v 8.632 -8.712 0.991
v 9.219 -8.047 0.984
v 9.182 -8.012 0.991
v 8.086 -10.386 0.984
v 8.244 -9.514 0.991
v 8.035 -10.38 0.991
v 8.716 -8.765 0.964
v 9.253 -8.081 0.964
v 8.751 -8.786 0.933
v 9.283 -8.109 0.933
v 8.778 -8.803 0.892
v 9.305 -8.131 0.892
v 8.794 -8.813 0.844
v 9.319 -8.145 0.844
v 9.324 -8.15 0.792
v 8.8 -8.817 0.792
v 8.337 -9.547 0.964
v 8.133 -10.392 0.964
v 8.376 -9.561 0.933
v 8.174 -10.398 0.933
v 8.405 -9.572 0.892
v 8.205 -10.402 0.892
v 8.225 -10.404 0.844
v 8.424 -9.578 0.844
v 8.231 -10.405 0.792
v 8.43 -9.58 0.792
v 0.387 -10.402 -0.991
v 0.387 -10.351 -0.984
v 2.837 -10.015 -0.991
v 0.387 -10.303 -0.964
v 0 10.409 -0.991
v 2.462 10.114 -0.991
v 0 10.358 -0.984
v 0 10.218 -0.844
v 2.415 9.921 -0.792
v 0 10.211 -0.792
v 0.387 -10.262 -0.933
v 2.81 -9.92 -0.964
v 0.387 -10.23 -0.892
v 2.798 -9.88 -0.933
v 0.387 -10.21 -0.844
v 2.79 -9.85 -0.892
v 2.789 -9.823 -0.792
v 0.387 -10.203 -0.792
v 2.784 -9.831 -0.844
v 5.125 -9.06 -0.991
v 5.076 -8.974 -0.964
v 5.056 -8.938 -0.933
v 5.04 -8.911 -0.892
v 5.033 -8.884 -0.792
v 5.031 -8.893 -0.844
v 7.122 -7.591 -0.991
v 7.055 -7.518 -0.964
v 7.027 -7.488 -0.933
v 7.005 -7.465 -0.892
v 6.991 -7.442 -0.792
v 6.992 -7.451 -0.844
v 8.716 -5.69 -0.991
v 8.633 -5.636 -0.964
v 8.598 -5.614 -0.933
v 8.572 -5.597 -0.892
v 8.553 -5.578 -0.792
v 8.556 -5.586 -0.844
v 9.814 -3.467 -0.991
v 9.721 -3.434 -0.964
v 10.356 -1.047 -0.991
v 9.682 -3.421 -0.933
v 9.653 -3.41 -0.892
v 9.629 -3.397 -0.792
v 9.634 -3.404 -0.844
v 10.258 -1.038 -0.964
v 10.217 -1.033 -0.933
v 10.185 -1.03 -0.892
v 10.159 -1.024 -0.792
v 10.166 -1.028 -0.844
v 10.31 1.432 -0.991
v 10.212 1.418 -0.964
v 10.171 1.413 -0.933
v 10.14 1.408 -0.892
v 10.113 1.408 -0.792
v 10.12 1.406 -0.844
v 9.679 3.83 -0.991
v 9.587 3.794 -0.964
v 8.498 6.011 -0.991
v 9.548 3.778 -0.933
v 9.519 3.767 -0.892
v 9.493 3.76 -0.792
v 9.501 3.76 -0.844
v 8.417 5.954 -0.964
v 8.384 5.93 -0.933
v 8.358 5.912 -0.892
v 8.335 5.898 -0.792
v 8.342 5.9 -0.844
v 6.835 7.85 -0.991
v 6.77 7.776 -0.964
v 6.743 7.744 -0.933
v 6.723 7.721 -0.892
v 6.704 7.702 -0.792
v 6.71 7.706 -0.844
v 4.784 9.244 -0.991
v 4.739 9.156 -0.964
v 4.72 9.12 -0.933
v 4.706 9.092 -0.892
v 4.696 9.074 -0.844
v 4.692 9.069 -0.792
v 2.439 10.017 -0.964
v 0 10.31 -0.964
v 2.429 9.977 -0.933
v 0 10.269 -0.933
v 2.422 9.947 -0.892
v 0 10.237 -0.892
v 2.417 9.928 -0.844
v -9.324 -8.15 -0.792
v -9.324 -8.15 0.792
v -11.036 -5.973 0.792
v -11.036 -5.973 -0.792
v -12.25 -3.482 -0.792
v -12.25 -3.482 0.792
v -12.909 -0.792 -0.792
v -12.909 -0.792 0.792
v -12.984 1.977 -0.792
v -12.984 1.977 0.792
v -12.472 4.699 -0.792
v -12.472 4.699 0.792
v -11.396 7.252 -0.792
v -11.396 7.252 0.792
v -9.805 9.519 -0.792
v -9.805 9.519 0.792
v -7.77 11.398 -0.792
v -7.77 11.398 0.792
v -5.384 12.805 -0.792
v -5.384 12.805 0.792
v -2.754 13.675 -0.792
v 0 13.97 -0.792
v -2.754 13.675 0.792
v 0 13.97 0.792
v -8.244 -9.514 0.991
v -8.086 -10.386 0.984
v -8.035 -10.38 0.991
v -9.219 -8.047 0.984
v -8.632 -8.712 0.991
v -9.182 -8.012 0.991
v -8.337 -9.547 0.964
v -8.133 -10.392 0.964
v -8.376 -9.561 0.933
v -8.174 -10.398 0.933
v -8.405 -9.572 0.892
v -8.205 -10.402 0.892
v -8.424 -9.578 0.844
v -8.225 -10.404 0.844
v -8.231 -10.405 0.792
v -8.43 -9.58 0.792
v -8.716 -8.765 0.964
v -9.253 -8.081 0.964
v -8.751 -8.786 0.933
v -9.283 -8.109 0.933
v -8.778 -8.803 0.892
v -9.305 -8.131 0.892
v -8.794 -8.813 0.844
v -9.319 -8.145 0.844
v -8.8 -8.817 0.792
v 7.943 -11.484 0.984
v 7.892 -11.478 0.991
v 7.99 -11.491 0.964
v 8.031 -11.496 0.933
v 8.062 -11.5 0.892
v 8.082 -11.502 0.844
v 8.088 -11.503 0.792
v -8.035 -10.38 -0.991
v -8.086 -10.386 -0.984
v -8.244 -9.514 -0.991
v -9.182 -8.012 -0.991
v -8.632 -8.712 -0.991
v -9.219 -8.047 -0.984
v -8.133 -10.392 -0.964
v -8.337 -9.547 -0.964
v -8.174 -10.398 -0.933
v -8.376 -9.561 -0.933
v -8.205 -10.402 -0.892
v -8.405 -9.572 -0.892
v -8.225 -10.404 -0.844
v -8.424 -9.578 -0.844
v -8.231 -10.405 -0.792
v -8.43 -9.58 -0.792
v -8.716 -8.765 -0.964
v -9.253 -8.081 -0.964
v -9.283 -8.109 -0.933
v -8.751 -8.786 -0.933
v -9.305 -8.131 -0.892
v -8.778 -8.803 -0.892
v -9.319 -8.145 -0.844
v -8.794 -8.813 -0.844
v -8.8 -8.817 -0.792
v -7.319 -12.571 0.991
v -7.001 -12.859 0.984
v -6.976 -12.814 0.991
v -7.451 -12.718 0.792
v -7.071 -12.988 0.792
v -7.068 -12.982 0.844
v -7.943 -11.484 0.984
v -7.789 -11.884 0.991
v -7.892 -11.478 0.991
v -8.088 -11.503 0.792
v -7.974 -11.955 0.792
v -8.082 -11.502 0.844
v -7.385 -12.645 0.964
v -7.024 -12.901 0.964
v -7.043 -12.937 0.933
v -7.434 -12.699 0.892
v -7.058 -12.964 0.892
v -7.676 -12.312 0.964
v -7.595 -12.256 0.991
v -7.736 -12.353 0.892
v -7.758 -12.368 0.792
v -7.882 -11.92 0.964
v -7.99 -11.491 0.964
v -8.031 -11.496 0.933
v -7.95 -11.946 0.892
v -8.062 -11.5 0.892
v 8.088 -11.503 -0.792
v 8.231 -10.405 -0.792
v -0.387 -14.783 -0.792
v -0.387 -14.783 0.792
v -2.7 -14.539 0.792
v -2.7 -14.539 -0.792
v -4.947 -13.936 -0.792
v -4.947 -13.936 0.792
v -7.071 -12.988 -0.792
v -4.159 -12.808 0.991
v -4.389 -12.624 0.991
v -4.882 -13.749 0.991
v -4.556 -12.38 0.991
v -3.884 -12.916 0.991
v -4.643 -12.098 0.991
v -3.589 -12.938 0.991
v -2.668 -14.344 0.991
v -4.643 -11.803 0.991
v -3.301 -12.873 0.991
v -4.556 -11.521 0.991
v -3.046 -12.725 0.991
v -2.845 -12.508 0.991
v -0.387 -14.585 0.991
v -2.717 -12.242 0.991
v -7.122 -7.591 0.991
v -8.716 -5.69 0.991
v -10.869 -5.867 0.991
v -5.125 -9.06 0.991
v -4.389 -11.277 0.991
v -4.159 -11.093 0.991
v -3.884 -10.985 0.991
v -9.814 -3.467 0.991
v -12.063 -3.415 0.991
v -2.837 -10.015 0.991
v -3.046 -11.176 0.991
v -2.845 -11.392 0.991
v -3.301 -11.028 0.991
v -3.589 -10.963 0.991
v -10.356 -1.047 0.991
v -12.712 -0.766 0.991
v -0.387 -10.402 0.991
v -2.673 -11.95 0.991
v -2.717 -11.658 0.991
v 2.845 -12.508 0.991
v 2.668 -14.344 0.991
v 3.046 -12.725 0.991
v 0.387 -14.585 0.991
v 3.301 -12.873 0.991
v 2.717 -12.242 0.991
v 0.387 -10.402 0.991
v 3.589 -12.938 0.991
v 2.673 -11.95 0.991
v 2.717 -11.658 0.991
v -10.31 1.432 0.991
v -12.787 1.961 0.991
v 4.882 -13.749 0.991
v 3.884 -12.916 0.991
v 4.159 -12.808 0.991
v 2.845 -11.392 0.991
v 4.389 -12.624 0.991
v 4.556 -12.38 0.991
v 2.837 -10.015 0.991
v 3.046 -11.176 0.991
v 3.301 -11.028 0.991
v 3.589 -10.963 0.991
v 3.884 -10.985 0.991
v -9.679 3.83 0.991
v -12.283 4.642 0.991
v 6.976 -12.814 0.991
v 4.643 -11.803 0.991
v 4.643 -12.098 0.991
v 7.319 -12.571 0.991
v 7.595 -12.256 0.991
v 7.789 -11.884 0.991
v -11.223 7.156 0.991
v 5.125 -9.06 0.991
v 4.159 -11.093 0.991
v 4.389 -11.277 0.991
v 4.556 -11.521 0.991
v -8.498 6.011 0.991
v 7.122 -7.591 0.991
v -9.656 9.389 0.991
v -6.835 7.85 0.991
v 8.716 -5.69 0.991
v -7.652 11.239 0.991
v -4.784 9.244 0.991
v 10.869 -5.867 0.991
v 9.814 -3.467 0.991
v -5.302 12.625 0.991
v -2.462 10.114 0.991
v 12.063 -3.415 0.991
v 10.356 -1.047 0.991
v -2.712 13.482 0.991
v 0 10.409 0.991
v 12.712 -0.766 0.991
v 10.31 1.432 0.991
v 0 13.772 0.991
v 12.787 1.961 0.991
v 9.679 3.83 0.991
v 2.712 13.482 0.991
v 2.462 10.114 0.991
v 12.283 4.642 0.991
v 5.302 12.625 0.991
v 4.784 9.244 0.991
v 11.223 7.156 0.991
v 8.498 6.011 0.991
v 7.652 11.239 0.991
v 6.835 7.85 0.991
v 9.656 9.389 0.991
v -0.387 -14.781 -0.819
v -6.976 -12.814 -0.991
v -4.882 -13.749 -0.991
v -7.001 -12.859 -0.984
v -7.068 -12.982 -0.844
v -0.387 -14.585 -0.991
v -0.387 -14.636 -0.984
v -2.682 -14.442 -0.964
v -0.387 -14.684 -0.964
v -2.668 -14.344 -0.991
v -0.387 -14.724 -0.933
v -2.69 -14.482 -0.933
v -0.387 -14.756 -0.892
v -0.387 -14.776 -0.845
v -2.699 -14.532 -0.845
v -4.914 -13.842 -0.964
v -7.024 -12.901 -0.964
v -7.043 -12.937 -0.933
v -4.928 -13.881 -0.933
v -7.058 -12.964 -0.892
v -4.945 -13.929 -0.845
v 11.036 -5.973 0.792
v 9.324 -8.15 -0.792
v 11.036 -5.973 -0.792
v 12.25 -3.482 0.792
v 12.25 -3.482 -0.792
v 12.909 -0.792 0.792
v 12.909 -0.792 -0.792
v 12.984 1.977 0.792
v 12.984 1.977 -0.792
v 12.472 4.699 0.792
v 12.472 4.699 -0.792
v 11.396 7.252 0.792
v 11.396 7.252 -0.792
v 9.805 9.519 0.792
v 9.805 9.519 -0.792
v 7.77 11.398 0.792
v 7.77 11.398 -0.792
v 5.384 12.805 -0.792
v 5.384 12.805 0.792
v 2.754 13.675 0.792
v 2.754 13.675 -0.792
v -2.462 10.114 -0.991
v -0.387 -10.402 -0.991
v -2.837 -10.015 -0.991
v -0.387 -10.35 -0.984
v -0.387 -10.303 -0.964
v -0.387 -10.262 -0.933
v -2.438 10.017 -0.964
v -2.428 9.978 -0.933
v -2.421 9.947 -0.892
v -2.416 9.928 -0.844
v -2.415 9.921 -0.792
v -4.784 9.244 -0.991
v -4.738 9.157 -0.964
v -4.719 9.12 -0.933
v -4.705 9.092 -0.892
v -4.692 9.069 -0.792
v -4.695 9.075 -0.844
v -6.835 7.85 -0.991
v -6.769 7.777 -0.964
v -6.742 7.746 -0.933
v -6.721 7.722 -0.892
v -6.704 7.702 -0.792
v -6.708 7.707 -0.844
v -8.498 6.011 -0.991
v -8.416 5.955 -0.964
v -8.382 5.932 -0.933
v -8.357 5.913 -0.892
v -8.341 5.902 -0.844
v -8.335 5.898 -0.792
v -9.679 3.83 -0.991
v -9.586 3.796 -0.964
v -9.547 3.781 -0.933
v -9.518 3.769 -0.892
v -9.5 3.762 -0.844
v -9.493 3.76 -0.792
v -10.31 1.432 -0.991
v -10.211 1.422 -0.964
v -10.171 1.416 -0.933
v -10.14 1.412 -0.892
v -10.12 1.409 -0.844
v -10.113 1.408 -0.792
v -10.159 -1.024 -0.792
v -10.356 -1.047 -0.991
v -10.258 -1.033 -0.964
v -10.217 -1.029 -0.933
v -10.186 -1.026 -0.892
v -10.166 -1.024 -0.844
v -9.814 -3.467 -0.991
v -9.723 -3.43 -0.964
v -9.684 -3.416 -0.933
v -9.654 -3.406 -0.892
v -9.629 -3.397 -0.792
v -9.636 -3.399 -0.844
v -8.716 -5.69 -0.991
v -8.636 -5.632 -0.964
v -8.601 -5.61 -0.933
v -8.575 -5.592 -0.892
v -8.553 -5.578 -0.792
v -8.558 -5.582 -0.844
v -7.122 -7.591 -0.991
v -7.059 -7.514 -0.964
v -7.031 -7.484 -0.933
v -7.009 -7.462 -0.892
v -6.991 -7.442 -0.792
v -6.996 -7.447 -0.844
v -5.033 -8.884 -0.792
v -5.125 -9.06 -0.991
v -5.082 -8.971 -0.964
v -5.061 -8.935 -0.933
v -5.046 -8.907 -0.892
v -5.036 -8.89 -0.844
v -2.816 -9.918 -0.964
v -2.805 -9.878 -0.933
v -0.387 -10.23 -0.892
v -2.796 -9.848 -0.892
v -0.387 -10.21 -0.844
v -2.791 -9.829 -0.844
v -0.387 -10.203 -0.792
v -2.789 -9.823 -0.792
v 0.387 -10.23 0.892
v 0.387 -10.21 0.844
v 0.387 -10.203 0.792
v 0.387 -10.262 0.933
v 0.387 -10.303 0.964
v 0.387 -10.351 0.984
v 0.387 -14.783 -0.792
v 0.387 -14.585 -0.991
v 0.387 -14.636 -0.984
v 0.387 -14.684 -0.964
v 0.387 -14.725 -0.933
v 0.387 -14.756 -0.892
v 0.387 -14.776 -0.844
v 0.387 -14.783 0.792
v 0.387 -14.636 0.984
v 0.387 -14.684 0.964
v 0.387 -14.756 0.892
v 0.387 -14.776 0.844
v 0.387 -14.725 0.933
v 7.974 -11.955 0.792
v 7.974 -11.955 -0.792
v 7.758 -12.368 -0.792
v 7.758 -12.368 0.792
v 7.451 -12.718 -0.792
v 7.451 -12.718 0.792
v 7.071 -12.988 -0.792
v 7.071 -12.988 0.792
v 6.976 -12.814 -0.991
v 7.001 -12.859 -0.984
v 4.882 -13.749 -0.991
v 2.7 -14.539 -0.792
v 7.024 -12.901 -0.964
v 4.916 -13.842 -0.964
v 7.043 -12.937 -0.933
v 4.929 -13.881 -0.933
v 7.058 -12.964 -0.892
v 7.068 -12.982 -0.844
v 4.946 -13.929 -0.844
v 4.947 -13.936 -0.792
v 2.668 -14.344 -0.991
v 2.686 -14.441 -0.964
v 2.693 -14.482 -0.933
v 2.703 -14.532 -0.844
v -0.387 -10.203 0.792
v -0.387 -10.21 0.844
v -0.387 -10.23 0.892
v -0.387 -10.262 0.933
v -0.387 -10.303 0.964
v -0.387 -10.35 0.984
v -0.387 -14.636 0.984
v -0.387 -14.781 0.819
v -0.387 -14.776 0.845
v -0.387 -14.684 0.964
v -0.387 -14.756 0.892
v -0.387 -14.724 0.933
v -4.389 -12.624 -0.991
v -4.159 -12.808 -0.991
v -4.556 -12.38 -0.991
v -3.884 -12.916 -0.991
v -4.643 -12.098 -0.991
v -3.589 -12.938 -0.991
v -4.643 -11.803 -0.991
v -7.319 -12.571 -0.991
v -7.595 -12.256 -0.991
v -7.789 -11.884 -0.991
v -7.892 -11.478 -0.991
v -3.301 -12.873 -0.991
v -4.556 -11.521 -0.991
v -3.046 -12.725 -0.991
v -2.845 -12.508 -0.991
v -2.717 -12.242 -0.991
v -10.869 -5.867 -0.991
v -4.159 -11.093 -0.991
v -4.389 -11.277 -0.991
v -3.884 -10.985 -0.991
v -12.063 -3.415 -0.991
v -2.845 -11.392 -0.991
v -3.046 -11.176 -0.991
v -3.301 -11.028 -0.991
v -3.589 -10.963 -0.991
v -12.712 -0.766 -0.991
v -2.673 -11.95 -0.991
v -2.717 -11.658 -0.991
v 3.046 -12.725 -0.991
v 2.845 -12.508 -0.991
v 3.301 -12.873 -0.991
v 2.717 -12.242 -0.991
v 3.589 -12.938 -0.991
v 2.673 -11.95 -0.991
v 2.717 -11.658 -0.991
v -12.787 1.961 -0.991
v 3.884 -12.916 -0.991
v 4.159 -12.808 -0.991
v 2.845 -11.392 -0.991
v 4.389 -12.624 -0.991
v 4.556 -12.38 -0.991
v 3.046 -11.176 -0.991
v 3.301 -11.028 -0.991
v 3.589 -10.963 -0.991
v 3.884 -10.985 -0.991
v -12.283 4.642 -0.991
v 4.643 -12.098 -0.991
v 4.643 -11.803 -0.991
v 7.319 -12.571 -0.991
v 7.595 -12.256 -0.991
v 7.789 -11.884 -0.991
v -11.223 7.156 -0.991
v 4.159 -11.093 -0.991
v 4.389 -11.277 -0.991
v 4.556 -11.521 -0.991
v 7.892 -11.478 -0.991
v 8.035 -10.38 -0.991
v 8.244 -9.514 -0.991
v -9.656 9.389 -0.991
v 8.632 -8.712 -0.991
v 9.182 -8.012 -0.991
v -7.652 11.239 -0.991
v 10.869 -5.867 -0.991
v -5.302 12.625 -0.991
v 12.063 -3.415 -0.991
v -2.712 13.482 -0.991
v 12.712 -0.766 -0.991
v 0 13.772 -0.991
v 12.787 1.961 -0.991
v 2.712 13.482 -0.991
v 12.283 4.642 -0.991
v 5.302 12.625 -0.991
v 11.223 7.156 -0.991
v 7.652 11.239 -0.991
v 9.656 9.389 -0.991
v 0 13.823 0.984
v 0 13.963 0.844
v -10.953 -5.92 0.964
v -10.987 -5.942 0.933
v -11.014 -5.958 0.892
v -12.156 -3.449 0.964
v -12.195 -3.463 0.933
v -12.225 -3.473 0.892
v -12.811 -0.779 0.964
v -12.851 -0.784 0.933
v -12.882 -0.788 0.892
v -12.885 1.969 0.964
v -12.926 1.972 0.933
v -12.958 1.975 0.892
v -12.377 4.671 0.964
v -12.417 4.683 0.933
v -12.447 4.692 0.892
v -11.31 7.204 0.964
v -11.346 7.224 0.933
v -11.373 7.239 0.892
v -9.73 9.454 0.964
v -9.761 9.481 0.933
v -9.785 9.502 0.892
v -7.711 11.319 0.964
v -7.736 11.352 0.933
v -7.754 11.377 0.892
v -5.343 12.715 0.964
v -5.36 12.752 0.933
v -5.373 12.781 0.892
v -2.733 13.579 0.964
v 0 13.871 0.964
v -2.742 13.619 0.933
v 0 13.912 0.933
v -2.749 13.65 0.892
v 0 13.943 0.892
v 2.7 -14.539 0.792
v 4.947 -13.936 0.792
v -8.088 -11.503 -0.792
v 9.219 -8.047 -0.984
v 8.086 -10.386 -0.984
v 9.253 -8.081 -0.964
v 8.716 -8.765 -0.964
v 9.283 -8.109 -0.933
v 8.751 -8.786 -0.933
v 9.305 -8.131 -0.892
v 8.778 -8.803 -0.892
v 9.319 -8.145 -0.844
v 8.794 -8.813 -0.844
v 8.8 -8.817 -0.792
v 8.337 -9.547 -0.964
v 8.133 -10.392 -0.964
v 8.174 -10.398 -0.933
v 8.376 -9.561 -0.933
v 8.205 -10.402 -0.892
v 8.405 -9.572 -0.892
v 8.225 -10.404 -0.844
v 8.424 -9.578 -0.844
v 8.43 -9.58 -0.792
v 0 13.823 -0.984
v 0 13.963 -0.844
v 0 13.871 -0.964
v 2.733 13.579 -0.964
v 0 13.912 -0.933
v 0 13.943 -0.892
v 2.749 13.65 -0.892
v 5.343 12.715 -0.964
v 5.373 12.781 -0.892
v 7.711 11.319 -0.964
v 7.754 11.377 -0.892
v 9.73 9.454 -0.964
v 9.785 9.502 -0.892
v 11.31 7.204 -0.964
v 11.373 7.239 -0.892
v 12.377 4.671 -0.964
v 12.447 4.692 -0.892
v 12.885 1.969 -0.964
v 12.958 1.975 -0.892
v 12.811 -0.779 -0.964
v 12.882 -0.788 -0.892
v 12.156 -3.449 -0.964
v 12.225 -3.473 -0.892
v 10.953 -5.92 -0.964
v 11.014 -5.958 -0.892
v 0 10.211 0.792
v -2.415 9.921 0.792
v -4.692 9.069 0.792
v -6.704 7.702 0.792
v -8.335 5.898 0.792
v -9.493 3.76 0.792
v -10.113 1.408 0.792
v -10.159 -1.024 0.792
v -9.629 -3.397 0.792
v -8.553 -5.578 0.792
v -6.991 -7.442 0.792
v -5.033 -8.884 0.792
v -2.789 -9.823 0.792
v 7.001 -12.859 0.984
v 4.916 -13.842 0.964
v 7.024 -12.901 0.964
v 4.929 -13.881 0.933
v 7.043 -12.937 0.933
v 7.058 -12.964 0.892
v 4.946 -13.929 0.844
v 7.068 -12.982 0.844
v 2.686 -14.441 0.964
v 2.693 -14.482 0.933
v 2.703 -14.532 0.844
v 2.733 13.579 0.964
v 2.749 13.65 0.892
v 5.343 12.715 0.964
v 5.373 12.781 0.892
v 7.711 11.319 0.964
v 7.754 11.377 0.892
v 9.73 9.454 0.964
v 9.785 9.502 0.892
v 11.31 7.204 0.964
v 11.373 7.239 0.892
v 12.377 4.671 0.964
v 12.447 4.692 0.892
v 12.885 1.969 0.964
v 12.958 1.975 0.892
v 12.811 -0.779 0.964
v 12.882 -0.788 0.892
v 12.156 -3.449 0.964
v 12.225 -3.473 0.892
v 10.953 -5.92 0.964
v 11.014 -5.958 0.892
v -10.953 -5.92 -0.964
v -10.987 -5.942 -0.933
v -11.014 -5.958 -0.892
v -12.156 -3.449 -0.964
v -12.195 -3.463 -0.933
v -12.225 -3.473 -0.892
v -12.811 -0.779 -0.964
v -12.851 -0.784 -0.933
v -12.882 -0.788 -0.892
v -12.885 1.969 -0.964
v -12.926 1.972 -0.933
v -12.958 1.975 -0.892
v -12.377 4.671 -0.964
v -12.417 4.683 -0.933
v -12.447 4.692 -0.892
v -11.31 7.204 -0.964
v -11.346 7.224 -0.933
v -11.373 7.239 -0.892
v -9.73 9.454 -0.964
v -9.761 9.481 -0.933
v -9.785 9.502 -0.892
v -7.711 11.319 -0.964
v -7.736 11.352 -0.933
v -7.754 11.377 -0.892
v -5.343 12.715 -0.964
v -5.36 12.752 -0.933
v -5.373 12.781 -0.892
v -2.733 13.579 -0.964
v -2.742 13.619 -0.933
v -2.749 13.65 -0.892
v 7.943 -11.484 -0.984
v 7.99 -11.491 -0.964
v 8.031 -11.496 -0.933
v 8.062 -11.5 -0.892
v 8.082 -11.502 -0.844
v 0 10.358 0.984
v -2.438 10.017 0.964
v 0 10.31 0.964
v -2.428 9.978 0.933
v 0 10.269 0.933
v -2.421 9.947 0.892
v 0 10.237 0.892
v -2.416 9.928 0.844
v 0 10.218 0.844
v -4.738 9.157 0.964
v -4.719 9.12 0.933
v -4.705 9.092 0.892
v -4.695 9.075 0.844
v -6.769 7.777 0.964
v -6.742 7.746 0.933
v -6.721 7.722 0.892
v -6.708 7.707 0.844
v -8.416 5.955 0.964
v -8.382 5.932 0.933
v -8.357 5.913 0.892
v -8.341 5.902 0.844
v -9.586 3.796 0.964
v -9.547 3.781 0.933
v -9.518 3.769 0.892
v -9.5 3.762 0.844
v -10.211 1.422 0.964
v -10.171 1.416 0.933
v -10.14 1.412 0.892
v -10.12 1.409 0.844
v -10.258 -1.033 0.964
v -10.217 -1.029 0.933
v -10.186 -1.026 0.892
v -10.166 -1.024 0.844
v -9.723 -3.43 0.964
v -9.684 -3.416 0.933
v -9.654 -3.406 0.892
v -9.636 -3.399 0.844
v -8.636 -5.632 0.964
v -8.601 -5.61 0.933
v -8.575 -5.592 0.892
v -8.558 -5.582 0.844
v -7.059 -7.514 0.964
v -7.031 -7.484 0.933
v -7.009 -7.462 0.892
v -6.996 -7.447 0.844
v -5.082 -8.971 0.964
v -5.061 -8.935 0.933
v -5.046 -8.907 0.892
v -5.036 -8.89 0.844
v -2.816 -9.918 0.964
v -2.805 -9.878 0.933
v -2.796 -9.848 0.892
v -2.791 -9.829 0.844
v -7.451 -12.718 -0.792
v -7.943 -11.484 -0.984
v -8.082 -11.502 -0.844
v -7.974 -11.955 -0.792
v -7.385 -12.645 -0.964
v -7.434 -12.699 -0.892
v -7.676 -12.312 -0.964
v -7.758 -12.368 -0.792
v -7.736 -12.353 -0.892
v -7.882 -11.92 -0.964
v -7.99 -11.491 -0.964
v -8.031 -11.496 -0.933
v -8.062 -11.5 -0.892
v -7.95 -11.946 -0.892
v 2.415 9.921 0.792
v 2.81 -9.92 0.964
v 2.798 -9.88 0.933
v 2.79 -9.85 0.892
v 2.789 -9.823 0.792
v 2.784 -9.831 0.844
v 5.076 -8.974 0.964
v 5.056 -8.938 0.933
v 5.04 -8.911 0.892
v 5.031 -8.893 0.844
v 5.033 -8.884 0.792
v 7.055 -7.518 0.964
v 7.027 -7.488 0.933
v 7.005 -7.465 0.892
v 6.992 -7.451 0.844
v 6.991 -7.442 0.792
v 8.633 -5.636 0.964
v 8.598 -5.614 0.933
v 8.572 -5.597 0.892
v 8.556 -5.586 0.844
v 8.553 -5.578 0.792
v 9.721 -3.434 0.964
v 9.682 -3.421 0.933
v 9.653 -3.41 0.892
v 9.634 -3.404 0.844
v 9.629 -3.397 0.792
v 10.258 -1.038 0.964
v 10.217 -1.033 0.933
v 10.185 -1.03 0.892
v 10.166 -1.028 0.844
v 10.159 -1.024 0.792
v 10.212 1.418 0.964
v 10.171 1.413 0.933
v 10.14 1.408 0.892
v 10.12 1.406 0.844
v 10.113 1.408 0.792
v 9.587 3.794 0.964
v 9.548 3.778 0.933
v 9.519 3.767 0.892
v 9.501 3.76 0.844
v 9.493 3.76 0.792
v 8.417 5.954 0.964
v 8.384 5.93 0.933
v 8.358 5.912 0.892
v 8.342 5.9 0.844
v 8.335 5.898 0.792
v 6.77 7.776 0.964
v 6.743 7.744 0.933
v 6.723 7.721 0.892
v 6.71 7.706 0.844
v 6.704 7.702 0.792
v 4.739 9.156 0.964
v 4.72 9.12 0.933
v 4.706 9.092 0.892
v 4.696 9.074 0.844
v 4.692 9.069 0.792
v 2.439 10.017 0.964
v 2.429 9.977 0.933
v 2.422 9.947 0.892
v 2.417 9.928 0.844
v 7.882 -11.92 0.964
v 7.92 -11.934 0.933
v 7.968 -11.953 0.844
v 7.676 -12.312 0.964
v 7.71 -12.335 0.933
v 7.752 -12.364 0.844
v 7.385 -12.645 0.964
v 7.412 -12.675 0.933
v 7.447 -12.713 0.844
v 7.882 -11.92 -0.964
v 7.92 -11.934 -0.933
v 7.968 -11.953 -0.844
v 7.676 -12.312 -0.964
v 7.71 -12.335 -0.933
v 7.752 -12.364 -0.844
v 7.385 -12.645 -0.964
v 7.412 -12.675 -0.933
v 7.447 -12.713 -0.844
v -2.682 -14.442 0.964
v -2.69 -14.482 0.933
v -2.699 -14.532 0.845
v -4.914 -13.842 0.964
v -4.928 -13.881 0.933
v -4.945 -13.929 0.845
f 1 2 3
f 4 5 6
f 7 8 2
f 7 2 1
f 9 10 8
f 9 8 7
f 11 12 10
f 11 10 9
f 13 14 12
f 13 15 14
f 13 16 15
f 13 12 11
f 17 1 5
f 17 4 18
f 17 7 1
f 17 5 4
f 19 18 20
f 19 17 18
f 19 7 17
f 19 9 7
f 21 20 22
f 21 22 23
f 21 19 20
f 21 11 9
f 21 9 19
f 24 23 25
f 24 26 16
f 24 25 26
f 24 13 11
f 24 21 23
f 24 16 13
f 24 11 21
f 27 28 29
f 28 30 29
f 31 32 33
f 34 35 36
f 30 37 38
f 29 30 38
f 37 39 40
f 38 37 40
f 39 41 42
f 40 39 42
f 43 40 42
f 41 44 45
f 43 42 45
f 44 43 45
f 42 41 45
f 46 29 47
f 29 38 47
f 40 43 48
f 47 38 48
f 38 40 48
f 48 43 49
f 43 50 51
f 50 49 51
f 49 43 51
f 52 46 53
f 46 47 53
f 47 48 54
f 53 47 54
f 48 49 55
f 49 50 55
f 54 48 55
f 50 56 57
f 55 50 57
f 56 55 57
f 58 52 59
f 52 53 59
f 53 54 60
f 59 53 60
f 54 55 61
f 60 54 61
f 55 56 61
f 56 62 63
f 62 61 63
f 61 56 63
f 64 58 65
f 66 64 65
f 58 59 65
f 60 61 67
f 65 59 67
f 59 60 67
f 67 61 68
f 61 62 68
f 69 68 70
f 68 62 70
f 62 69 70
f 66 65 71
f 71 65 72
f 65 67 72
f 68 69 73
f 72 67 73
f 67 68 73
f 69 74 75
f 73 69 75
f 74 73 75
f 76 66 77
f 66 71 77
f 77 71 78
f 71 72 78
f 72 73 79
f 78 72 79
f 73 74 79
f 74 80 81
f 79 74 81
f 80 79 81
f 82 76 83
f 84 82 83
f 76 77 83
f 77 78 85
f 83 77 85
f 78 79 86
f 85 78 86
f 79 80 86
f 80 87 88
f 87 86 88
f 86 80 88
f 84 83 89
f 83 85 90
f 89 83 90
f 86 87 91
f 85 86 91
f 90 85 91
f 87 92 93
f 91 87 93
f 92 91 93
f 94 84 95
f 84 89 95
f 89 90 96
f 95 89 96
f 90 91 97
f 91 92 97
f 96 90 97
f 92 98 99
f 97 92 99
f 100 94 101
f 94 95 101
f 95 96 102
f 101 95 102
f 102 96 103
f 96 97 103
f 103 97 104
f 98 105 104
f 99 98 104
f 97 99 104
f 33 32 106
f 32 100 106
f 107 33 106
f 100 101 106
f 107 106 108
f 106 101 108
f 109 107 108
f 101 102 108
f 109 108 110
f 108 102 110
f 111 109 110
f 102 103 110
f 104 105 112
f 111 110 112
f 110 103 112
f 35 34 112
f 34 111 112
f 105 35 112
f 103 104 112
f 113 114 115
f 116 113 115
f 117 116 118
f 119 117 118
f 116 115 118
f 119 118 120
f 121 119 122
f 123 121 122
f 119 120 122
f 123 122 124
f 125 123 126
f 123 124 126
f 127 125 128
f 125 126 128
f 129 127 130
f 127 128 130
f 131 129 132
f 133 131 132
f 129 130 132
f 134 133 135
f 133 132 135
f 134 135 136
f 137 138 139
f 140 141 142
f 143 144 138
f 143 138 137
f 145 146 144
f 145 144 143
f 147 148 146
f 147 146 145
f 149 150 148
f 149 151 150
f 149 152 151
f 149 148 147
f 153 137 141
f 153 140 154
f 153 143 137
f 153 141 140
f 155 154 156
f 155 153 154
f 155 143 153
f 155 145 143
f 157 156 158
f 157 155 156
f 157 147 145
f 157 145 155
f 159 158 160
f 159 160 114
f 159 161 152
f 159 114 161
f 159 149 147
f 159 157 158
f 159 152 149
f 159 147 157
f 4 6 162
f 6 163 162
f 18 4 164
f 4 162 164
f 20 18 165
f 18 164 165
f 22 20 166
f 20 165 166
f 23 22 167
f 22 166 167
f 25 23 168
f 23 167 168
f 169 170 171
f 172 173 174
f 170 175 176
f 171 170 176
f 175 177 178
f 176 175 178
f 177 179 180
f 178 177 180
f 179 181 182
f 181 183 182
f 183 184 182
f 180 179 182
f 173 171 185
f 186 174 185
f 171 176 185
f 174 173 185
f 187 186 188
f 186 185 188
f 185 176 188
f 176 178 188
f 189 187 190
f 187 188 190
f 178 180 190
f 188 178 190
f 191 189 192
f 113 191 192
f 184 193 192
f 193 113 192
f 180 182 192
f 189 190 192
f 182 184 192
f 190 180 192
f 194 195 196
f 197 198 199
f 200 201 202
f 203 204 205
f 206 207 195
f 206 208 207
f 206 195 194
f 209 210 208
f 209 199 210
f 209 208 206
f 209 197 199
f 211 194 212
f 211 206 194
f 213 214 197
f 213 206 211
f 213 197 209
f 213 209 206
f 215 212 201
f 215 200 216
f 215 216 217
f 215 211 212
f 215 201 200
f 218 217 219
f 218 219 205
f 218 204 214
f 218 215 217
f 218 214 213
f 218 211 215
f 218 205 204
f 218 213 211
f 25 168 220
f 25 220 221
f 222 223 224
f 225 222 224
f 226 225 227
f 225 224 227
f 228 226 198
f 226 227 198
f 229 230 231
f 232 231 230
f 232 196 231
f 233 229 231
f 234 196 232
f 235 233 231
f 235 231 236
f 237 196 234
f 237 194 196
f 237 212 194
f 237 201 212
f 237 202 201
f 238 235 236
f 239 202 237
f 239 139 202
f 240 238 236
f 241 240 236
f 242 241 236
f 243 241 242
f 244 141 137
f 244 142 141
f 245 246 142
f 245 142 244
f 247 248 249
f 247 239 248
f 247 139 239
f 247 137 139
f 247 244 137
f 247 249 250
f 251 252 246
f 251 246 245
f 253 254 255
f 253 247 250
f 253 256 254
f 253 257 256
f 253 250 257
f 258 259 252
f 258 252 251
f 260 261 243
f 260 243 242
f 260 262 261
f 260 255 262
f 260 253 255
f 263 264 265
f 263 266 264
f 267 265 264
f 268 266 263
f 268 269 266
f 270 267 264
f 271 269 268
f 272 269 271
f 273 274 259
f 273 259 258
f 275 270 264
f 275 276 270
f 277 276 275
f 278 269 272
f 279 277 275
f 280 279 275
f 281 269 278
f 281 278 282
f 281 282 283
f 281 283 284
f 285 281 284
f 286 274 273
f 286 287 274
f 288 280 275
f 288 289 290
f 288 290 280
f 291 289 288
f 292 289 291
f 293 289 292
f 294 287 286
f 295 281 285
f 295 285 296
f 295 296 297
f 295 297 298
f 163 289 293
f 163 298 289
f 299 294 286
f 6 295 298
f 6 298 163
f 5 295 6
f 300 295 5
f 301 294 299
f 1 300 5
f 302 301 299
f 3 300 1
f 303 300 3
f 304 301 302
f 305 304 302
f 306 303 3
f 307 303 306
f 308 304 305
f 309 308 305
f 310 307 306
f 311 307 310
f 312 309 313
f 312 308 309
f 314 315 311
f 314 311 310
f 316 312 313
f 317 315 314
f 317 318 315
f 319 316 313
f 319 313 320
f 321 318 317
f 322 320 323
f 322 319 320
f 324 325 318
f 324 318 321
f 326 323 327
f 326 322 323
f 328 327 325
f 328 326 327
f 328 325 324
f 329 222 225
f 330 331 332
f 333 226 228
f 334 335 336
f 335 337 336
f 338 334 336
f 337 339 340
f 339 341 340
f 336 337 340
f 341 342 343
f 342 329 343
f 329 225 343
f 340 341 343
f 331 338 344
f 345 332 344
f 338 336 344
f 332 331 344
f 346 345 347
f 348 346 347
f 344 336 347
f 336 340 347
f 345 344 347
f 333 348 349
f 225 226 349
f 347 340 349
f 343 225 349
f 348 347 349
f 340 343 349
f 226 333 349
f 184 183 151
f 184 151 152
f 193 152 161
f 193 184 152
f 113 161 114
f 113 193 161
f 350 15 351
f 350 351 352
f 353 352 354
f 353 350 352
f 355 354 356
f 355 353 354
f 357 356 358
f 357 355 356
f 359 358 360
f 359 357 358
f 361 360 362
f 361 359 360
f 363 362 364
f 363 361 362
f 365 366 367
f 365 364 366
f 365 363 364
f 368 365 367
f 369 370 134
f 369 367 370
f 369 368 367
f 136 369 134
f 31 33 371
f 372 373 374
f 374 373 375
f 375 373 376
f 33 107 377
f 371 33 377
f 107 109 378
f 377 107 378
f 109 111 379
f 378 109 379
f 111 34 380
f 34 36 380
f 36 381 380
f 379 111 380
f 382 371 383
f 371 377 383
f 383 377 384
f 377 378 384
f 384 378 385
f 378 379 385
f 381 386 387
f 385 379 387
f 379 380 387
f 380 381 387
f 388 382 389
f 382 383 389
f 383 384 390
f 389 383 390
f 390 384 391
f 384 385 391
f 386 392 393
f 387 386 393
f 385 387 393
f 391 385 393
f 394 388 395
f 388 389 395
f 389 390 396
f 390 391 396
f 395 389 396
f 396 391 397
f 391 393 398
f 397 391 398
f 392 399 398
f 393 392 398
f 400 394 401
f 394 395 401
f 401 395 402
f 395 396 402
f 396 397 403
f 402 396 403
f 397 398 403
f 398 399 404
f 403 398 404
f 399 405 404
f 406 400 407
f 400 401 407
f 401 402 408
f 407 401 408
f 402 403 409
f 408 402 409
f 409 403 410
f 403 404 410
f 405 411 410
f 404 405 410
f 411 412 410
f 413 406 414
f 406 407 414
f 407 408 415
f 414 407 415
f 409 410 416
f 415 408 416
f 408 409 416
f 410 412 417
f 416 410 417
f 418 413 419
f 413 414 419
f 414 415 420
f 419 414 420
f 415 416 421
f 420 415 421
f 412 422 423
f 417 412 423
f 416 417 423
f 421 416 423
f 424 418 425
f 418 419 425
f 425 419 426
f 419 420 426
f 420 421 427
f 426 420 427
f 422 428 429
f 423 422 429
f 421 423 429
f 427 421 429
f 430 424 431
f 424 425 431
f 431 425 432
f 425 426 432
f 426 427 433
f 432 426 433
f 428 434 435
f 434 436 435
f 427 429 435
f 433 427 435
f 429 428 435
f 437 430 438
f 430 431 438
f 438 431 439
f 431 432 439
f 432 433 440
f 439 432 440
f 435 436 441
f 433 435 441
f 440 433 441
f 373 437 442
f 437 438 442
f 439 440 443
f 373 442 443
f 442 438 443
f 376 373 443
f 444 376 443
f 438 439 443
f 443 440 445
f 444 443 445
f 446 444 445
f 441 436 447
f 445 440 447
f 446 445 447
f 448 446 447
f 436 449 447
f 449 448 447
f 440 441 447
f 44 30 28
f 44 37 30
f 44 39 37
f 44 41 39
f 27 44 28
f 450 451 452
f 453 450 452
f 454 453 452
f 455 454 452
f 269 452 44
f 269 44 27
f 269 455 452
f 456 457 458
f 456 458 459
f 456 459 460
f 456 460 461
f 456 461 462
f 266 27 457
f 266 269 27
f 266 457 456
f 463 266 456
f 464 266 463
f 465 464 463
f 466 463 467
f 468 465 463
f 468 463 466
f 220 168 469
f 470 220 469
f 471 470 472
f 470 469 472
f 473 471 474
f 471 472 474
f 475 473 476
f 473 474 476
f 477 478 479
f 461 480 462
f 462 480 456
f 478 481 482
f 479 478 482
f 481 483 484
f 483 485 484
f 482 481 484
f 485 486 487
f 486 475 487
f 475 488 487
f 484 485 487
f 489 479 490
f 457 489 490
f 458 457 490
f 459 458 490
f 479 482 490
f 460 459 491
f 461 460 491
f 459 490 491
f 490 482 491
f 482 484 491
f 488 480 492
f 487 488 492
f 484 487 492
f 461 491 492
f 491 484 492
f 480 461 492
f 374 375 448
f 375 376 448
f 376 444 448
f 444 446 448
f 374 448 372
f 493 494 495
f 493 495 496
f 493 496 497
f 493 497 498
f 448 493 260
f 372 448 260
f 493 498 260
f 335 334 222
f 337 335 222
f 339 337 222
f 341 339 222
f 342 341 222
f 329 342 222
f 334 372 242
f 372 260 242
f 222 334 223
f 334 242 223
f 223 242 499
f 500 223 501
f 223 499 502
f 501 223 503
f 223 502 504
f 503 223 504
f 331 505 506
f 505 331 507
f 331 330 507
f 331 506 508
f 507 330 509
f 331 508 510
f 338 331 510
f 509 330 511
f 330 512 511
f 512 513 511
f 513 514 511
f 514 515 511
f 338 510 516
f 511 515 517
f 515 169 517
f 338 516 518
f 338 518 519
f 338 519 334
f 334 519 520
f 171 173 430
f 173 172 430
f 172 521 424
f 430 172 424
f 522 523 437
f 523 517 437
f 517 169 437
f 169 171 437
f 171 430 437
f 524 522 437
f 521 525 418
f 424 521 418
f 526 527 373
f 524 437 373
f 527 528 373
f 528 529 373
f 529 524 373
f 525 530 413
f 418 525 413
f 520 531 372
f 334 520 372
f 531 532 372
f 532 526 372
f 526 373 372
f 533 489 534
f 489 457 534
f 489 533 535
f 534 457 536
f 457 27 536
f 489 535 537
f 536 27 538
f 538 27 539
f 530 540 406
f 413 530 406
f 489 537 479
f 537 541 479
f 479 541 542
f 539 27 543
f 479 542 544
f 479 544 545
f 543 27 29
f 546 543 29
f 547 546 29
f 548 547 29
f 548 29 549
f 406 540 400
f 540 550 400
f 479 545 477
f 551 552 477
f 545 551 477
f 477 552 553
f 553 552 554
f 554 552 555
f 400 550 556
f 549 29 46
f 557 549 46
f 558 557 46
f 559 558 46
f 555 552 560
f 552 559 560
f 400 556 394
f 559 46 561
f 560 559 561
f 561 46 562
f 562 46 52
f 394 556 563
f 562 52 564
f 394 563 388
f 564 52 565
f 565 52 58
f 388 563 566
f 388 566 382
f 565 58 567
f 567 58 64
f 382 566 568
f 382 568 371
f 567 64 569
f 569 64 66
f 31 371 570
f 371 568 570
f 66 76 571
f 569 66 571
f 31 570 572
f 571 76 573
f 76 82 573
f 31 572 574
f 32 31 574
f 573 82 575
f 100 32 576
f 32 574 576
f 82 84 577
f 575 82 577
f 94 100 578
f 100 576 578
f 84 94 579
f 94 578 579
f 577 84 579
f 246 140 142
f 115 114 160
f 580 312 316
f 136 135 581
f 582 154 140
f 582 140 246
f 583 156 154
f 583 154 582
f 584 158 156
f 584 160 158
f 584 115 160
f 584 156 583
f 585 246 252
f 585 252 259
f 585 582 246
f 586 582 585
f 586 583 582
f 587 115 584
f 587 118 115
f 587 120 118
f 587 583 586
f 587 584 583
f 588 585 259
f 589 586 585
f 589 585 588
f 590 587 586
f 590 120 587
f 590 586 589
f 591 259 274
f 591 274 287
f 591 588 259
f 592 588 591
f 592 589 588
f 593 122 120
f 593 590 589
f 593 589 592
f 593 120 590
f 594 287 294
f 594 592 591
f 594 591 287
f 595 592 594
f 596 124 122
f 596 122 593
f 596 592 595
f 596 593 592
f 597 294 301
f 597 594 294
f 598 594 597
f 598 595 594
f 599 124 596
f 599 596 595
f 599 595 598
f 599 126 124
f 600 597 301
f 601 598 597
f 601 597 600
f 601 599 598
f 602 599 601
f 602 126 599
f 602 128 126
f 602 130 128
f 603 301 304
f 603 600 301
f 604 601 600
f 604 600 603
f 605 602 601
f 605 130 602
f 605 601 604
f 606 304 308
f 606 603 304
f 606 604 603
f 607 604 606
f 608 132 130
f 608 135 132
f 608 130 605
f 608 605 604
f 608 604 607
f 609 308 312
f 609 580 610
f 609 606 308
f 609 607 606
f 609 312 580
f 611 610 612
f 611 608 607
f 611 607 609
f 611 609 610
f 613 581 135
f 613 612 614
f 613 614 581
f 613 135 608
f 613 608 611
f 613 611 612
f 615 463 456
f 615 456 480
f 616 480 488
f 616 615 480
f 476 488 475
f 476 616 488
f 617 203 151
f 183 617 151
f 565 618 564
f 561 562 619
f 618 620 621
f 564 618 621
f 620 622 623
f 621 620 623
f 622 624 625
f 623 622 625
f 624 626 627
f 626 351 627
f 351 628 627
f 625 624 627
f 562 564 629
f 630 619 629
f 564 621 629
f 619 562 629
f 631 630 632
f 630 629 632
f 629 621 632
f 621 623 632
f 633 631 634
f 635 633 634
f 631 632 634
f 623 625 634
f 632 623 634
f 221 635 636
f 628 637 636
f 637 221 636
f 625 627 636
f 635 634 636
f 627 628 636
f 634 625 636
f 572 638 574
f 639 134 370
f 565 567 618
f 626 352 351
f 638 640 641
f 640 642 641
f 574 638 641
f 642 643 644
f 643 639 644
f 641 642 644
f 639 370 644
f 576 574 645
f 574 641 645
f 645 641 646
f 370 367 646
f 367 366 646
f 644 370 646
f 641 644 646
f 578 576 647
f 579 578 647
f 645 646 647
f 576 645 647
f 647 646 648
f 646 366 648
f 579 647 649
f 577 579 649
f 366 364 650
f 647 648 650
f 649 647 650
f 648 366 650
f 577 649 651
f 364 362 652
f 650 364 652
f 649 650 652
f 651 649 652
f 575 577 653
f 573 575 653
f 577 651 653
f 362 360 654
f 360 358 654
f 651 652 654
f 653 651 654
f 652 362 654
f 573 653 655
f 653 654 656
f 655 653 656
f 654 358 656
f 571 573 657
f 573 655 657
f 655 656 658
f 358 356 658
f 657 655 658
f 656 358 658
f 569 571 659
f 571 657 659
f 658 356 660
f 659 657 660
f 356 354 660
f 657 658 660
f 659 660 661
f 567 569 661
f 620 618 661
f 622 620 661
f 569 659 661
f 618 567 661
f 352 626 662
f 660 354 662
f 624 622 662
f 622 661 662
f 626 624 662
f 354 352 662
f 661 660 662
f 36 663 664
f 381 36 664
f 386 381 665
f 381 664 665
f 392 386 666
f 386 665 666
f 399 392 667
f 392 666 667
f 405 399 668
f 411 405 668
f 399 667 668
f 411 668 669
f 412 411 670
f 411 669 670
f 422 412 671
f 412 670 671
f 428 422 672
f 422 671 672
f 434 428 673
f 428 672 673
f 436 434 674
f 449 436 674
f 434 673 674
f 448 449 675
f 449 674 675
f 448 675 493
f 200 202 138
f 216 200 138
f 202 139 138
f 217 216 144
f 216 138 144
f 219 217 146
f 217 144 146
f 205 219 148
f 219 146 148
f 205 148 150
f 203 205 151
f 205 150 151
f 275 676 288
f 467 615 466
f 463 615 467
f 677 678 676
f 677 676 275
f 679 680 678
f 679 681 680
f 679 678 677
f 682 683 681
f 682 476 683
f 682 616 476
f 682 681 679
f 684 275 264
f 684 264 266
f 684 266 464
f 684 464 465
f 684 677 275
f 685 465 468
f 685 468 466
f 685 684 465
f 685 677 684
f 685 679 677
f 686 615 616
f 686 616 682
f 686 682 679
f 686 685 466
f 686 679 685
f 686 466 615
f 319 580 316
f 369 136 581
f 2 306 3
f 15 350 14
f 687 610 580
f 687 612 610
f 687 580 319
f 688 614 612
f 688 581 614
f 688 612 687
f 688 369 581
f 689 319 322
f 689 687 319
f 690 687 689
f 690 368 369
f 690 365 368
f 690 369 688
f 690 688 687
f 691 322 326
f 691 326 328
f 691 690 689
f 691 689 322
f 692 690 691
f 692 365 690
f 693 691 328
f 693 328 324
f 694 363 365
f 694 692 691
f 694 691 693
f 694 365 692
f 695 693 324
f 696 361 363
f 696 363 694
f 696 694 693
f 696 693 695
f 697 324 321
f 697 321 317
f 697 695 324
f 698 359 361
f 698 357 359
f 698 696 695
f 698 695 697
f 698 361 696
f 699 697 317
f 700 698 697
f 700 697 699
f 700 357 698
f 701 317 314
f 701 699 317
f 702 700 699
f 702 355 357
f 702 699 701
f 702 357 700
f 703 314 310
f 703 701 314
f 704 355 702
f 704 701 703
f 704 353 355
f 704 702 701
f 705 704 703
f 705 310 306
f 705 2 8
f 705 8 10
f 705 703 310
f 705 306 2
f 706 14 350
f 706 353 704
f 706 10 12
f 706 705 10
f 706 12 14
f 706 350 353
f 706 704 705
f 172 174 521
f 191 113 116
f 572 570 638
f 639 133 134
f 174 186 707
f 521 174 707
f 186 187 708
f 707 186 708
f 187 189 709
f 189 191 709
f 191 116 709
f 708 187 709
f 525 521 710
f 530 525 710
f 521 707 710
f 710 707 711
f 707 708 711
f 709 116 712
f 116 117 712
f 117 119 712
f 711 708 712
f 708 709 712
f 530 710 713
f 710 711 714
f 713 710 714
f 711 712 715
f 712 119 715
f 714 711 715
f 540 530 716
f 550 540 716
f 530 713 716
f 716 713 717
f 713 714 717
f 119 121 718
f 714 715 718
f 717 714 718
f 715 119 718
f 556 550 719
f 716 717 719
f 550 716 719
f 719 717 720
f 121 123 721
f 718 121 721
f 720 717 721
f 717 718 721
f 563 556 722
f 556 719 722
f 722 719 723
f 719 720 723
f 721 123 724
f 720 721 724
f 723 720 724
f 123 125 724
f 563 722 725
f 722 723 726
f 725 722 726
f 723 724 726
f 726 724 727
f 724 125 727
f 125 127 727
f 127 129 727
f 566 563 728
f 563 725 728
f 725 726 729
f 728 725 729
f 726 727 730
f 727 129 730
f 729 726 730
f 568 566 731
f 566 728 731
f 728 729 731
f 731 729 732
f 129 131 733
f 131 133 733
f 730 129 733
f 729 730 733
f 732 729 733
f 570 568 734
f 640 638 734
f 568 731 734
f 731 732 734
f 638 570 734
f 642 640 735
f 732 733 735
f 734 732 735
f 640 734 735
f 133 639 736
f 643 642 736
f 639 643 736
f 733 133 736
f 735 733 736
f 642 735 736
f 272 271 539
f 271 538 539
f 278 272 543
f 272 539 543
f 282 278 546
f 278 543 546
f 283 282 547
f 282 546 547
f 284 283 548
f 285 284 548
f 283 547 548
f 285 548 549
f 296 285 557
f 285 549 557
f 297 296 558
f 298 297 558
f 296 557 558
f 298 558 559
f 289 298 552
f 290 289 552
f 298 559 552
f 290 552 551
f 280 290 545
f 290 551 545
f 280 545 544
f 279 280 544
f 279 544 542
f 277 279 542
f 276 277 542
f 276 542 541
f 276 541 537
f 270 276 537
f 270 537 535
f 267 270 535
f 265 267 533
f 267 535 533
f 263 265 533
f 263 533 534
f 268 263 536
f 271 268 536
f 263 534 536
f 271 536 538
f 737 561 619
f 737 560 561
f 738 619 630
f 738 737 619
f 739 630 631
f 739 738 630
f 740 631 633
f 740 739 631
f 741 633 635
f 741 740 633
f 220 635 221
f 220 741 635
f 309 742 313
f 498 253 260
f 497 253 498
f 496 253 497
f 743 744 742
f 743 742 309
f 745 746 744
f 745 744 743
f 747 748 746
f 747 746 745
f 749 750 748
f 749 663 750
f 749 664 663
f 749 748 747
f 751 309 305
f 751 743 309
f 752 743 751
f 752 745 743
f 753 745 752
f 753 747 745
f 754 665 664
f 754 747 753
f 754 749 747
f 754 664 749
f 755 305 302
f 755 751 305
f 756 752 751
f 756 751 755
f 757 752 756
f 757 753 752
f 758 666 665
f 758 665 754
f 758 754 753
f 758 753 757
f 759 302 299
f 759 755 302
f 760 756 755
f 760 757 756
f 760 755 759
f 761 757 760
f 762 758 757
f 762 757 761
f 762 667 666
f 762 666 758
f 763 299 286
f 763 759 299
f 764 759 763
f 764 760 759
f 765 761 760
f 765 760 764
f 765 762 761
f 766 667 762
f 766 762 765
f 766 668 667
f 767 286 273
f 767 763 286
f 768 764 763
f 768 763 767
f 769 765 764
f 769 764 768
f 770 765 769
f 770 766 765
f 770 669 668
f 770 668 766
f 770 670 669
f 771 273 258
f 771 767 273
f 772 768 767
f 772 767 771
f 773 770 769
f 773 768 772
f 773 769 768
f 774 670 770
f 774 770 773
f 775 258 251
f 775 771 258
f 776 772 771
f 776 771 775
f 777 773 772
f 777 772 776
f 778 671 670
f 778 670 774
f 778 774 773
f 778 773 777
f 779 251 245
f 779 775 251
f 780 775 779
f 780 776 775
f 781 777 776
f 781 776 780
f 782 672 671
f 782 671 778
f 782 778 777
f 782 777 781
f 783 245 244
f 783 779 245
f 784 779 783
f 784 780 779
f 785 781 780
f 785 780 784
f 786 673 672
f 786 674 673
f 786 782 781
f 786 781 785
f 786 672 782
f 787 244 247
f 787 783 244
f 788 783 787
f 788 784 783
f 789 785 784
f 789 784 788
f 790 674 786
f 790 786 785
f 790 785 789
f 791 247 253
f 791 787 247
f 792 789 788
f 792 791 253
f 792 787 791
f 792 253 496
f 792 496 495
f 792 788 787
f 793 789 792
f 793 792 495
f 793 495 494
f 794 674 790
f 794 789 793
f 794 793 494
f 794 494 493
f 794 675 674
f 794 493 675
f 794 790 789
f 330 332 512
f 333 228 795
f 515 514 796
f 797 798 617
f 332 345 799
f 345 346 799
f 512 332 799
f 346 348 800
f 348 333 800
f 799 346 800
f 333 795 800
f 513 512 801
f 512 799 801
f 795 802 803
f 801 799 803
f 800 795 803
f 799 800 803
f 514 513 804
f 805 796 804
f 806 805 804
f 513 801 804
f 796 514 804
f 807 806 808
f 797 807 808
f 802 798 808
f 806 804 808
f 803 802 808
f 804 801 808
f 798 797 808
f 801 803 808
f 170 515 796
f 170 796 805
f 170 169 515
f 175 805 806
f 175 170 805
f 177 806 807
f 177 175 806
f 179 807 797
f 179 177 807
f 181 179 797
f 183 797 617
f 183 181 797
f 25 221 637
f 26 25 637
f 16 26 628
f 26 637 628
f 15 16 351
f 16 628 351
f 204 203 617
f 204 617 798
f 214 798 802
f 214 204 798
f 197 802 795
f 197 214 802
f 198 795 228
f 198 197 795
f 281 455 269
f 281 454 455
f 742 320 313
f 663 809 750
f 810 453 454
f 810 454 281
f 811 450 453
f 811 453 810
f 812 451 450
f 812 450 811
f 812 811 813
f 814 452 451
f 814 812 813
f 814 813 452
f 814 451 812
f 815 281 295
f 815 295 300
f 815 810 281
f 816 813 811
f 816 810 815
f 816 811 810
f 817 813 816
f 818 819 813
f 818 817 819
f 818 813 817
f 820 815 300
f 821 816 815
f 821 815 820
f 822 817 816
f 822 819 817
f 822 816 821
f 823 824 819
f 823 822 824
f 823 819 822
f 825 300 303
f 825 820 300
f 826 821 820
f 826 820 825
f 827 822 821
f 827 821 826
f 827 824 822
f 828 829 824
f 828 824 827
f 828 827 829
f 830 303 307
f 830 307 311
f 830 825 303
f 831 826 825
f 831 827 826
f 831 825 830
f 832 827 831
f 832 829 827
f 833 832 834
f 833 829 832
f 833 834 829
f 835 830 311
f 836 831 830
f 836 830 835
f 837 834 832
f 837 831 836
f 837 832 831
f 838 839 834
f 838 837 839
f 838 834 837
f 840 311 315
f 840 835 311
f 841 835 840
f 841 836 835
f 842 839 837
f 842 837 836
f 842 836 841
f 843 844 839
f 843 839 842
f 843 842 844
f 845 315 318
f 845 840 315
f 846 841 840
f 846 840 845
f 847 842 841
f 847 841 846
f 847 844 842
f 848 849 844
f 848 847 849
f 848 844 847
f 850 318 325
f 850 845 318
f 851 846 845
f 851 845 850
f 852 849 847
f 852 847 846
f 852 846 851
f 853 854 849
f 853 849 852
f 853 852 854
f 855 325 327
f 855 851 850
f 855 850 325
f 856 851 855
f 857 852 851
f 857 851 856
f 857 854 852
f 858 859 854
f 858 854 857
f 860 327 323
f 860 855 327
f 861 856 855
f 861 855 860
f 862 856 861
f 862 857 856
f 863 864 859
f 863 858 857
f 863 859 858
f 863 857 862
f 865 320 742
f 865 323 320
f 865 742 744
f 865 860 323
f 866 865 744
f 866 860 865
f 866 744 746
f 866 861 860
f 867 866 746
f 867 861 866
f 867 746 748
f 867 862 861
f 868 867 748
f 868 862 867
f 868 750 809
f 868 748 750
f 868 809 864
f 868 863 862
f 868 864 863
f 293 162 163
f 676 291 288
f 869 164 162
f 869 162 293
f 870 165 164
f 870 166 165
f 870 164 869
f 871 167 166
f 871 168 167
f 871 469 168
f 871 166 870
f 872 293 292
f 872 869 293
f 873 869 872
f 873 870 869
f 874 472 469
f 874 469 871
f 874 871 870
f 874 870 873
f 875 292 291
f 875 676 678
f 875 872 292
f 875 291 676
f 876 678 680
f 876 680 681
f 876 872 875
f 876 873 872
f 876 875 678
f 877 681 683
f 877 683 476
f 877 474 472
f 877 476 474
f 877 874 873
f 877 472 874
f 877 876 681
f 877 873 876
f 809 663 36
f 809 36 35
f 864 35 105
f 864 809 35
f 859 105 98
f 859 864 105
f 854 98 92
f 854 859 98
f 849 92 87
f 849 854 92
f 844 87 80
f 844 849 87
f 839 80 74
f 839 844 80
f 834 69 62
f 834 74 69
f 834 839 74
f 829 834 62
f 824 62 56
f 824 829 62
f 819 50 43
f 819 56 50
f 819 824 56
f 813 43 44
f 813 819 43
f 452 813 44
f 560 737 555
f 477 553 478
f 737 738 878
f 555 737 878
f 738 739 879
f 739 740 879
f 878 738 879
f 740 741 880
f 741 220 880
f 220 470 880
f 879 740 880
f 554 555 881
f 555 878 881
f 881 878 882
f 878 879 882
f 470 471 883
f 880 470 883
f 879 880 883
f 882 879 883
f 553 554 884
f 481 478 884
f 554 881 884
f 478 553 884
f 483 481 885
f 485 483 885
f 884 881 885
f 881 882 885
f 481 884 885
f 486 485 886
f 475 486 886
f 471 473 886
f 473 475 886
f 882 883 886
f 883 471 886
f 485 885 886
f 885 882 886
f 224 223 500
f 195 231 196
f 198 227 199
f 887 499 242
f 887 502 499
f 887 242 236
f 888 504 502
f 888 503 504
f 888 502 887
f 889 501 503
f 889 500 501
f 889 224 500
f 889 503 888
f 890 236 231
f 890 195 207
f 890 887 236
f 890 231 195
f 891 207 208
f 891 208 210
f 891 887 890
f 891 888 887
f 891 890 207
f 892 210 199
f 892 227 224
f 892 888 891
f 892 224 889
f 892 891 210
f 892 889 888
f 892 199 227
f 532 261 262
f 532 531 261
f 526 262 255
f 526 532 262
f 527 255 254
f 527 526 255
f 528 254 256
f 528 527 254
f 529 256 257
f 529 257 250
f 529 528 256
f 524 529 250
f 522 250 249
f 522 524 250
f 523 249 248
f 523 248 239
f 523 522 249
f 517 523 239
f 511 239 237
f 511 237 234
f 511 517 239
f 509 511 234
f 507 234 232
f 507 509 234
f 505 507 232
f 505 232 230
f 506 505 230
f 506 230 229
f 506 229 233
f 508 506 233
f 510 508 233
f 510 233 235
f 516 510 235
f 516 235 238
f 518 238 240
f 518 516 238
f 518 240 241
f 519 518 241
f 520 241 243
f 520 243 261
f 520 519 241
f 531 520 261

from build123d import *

# Parameters (mm, degrees)
SKETCH3_R           = 0.9906
BOSS_EXTRUDE1_DEPTH = 0.9906
FILLET1_R           = 3.9624
FILLET2_R           = 1.9812
FILLET3_R           = 0.19812


with BuildPart() as part:
    # Sketch3 → Boss-Extrude1 (new, symmetric)
    with BuildSketch(Plane.XY):
        with BuildLine():
            Line((-7.963913355, -12.460220996), (-8.414612562, -8.997336074))
            ThreePointArc((-8.414612562, -8.997336074), (-12.230129097, 5.425677886), (0, 13.97))
            Line((0, 13.97), (0, 10.2108))
            ThreePointArc((0, 10.2108), (-10.208964753, 0.193585415), (-0.387101241, -10.203459672))
            Line((-0.387101241, -10.203459672), (-0.387101241, -14.7828))
            ThreePointArc((-0.387101241, -14.7828), (-4.333988291, -14.138513667), (-7.963913355, -12.460220996))
        make_face()
        with Locations((-3.663271004, -11.95047233)):
            Circle(SKETCH3_R, mode=Mode.SUBTRACT)
    extrude(amount=BOSS_EXTRUDE1_DEPTH, both=True)

    # Fillet1
    fillet1_edges = [part.edges().sort_by_distance(p)[0] for p in [
        (-8.414612562, -8.997336074, 0),
    ]]
    fillet(fillet1_edges, radius=FILLET1_R)

    # Fillet2
    fillet2_edges = [part.edges().sort_by_distance(p)[0] for p in [
        (-7.963913355, -12.460220996, 0),
    ]]
    fillet(fillet2_edges, radius=FILLET2_R)

    # Mirror1: part across plane


with BuildPart() as part_1:
    add(part.part)
    add(part.part.mirror(Plane(origin=(0, 13.97, 0.9906), x_dir=(0, 0, 1), z_dir=(-1, 0, 0))))

    # Fillet3
    fillet3_edges = [part_1.edges().sort_by_distance(p)[0] for p in [
        (-10.208964753, 0.193585415, 0.9906),
        (-8.159915946, -10.954262245, -0.9906),
        (-8.159915946, -10.954262245, 0.9906),
        (-8.594751987, -9.188846365, -0.9906),
        (-8.594751987, -9.188846365, 0.9906),
        (-3.835638548, -14.281768103, -0.9906),
        (-3.835638548, -14.281768103, 0.9906),
        (-7.758056172, -12.367660081, -0.9906),
        (-7.758056172, -12.367660081, 0.9906),
        (-12.002363858, 6.004215822, 0.9906),
        (3.835638548, -14.281768103, -0.9906),
        (8.159915946, -10.954262245, -0.9906),
        (8.159915946, -10.954262245, 0.9906),
        (3.835638548, -14.281768103, 0.9906),
        (8.594751987, -9.188846365, 0.9906),
        (8.594751987, -9.188846365, -0.9906),
        (7.758056172, -12.367660081, 0.9906),
        (7.758056172, -12.367660081, -0.9906),
        (-10.208964753, 0.193585415, -0.9906),
        (-12.002363858, 6.004215822, -0.9906),
    ]]
    fillet(fillet3_edges, radius=FILLET3_R)


solid = part_1.part
